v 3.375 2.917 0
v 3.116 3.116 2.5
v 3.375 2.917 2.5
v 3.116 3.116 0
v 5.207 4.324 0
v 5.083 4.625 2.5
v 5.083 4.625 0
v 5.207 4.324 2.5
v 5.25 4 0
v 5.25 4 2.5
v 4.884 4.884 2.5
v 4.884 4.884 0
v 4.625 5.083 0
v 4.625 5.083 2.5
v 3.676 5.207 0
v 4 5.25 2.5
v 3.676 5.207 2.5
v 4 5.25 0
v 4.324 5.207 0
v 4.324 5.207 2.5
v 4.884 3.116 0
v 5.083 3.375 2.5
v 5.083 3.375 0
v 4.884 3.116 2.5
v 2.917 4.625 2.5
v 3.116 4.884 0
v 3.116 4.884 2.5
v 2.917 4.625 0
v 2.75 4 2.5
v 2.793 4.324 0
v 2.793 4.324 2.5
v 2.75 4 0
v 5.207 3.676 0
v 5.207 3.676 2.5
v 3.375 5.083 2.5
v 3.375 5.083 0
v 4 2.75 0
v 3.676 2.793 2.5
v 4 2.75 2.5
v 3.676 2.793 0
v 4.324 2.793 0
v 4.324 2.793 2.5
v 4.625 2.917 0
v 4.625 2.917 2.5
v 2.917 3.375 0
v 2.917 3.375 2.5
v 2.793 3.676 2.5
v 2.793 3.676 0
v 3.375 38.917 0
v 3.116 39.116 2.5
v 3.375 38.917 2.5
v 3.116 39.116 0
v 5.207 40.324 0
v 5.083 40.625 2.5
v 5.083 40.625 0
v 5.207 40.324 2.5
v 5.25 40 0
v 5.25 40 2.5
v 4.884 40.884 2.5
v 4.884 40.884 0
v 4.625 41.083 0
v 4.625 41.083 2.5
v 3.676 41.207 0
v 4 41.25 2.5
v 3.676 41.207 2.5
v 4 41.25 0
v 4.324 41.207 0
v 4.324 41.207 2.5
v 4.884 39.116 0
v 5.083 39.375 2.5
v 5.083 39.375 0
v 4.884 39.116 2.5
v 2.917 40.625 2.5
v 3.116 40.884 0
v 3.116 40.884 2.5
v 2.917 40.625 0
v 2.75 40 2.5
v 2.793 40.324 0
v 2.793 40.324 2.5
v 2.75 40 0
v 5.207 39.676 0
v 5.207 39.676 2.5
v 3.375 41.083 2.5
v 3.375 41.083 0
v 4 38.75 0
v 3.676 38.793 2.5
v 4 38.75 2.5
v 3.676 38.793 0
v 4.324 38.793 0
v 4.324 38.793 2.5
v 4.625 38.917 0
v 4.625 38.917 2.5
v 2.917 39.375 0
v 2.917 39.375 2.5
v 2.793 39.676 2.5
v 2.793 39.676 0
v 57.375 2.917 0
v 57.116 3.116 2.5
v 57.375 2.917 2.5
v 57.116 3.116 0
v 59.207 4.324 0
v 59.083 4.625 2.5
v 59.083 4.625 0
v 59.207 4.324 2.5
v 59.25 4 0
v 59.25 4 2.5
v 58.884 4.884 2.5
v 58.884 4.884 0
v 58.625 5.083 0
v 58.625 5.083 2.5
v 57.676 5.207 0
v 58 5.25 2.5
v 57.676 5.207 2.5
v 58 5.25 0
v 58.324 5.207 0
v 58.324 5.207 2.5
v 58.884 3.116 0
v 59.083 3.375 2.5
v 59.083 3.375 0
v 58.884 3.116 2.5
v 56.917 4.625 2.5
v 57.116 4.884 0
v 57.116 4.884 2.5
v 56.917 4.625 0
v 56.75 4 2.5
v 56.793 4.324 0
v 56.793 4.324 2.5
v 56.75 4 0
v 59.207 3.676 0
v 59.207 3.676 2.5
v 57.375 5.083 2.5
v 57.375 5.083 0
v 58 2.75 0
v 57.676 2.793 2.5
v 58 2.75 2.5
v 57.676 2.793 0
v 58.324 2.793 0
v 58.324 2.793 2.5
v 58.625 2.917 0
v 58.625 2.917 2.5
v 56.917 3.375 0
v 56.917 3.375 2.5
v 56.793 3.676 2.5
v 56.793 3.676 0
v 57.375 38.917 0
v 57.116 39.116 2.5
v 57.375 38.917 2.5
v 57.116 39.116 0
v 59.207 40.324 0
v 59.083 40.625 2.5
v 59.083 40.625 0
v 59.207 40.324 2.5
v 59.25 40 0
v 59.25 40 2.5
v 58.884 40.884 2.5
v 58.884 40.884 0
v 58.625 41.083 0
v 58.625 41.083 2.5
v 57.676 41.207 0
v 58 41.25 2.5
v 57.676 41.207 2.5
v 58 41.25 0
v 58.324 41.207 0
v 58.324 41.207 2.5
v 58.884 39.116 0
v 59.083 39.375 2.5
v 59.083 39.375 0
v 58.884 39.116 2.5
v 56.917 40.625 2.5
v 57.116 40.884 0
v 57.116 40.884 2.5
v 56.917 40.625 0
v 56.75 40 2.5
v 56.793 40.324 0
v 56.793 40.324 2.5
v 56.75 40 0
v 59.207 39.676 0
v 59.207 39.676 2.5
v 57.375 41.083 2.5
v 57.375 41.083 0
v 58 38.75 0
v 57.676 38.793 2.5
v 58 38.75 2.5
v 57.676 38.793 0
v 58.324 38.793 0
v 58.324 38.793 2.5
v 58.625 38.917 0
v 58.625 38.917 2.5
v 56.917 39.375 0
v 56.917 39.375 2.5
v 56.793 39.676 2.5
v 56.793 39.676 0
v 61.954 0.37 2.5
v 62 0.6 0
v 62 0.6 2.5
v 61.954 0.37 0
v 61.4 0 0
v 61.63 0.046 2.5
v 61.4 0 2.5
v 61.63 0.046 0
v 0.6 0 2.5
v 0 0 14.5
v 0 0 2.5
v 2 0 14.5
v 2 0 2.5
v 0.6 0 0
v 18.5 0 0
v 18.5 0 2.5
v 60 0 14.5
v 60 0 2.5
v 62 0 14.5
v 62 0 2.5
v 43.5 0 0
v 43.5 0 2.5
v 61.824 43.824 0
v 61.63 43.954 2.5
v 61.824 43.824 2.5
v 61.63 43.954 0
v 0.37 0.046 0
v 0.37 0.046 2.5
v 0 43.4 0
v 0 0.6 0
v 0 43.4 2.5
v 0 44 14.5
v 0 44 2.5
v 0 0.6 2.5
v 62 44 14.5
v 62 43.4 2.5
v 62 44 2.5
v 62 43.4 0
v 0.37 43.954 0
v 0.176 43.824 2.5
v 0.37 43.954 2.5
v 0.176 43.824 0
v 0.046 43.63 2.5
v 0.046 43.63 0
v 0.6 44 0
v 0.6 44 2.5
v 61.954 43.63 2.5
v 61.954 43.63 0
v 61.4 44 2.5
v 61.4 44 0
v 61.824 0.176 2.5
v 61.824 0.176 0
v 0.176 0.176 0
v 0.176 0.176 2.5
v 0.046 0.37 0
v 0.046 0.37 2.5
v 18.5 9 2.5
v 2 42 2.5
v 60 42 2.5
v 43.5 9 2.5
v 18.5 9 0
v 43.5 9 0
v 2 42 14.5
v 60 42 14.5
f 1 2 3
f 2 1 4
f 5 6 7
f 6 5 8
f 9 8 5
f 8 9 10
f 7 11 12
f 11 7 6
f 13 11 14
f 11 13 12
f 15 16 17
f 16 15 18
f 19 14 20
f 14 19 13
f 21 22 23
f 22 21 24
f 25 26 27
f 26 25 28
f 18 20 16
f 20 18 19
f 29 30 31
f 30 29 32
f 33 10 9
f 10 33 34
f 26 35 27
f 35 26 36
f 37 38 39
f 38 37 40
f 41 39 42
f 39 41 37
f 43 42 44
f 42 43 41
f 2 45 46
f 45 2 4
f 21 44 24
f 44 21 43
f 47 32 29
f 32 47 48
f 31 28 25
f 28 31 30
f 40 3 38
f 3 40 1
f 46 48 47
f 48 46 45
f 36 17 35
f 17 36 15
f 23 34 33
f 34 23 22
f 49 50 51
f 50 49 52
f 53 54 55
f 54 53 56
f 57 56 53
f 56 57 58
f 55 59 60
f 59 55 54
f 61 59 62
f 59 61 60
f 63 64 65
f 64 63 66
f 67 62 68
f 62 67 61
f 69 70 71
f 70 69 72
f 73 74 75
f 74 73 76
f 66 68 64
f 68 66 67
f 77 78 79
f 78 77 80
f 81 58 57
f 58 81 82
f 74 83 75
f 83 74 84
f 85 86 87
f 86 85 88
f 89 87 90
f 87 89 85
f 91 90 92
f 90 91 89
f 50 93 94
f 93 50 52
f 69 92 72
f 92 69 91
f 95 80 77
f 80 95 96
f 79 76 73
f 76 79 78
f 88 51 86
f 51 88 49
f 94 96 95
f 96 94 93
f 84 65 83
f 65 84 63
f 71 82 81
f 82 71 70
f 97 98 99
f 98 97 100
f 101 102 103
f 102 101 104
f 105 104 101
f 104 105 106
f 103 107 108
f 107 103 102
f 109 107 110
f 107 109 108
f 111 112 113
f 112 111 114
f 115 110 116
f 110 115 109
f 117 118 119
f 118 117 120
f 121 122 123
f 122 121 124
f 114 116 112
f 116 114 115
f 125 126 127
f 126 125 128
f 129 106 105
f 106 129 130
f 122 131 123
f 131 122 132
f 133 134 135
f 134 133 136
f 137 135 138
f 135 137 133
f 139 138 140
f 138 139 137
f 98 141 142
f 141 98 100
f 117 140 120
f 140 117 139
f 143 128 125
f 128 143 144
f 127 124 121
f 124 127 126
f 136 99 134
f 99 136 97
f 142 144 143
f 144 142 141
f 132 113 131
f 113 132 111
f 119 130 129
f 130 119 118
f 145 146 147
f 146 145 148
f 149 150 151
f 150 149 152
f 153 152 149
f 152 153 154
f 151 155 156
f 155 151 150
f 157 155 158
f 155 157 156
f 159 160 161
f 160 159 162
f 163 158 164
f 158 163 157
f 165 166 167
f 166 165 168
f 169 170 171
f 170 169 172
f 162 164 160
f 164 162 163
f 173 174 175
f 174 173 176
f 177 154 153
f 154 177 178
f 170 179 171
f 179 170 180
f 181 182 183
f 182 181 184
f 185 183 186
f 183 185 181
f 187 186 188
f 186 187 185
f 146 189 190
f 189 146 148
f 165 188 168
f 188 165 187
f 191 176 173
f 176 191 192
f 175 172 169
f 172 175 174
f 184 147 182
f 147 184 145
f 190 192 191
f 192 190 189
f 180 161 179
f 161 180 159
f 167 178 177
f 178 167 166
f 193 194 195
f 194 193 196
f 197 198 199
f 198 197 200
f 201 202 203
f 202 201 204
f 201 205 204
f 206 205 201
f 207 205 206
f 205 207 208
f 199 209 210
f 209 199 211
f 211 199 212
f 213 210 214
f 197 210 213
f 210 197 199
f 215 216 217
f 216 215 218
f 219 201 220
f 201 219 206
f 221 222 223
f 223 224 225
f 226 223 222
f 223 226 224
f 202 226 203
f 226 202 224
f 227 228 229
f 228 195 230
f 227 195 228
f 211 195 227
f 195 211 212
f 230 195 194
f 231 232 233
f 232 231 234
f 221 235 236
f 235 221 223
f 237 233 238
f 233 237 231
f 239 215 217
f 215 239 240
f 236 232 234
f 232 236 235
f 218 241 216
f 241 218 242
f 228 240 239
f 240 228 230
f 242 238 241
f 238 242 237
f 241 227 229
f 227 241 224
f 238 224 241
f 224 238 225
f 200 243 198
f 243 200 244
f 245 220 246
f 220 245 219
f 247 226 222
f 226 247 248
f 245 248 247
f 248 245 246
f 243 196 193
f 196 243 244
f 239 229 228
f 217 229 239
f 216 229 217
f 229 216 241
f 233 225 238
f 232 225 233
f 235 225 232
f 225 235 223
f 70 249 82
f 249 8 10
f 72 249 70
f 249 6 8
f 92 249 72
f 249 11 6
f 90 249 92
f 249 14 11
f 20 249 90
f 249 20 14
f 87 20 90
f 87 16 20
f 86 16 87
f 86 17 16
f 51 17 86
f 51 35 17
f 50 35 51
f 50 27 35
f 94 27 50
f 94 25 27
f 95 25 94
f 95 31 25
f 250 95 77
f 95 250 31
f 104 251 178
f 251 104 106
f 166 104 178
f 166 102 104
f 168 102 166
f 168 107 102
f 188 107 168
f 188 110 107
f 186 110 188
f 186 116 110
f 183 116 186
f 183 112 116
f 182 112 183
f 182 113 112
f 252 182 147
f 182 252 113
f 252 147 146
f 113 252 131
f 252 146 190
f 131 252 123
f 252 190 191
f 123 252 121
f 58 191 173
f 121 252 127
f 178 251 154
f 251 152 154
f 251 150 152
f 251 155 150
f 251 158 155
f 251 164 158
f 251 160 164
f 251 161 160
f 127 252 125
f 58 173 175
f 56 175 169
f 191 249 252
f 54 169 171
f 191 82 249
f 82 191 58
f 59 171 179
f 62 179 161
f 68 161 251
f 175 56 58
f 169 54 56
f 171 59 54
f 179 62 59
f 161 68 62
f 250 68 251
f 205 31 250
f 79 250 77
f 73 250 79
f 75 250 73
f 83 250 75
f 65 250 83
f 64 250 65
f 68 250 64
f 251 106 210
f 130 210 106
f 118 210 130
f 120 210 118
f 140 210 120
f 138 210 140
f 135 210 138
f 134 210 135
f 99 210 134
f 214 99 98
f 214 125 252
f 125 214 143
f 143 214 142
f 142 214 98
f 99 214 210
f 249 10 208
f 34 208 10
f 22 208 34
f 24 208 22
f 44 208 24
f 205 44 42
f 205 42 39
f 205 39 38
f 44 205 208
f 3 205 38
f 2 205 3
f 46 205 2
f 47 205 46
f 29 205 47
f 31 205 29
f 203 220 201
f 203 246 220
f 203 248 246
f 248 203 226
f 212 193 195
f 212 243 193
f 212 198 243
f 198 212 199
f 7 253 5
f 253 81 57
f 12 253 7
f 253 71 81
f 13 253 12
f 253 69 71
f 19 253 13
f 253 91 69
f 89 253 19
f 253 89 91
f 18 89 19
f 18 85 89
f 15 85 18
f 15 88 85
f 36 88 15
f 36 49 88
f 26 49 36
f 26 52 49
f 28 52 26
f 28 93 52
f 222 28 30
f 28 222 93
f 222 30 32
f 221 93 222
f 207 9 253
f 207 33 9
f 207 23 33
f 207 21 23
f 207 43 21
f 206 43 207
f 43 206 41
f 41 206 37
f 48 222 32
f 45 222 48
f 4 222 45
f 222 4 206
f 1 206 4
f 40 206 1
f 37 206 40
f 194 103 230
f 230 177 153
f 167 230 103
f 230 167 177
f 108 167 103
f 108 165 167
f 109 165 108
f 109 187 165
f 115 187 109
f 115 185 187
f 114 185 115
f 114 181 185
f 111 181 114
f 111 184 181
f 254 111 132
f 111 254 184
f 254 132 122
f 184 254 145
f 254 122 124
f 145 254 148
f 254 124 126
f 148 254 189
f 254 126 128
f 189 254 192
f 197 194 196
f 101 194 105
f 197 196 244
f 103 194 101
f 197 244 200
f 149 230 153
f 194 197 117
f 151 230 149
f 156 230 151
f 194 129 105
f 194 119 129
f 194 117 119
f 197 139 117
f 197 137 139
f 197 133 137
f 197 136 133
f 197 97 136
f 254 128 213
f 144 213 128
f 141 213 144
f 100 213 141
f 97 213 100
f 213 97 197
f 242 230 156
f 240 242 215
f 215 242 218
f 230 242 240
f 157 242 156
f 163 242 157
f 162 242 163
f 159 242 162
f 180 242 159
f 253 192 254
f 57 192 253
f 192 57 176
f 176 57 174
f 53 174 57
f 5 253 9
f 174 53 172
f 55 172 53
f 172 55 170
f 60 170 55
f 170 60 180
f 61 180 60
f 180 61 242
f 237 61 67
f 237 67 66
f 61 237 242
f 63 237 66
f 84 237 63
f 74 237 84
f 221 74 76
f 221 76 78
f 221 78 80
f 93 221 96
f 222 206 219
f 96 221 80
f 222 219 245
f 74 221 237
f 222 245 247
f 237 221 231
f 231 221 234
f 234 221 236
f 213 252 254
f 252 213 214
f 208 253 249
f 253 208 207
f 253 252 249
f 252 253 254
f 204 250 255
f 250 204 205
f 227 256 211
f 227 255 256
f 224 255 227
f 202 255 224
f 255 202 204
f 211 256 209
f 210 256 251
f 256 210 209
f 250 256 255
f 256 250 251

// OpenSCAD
// Bureau fixture: removable camera tray for the inspection rover.
// Parametric: sized from payload width; changes when the payload
// requirement changes. All dimensions in millimetres.

// --- parameters (overridable with -D on the OpenSCAD command line) ---
tray_width    = 62;    // mm — payload bay width
tray_depth    = 44;    // mm — front-to-back
tray_thick    = 2.5;   // mm — plate thickness
wall_h        = 12;    // mm — side wall height
wall_t        = 2.0;   // mm — wall thickness
cam_slot_w    = 25;    // mm — camera module slot (Pi Camera Module 3)
cam_slot_d    = 9;     // mm — slot depth into the plate
hole_d        = 2.5;   // mm — M2.5 mounting hole diameter
hole_inset    = 4;     // mm — hole inset from tray corners
chamfer       = 0.6;   // mm — edge chamfer on the plate

module plate() {
    difference() {
        // base plate with corner chamfers
        hull() {
            for (x = [chamfer, tray_width - chamfer])
                for (y = [chamfer, tray_depth - chamfer])
                    translate([x, y, 0])
                        cylinder(r = chamfer, h = tray_thick, $fn = 16);
        }
        // camera slot, centered front edge
        translate([(tray_width - cam_slot_w) / 2, -1, -1])
            cube([cam_slot_w, cam_slot_d + 1, tray_thick + 2]);
        // four M2.5 mounting holes
        for (x = [hole_inset, tray_width - hole_inset])
            for (y = [hole_inset, tray_depth - hole_inset])
                translate([x, y, -1])
                    cylinder(d = hole_d, h = tray_thick + 2, $fn = 24);
    }
}

module walls() {
    // left/right retaining walls
    for (x = [0, tray_width - wall_t])
        translate([x, 0, tray_thick])
            cube([wall_t, tray_depth, wall_h]);
    // rear wall
    translate([0, tray_depth - wall_t, tray_thick])
        cube([tray_width, wall_t, wall_h]);
}

plate();
walls();
